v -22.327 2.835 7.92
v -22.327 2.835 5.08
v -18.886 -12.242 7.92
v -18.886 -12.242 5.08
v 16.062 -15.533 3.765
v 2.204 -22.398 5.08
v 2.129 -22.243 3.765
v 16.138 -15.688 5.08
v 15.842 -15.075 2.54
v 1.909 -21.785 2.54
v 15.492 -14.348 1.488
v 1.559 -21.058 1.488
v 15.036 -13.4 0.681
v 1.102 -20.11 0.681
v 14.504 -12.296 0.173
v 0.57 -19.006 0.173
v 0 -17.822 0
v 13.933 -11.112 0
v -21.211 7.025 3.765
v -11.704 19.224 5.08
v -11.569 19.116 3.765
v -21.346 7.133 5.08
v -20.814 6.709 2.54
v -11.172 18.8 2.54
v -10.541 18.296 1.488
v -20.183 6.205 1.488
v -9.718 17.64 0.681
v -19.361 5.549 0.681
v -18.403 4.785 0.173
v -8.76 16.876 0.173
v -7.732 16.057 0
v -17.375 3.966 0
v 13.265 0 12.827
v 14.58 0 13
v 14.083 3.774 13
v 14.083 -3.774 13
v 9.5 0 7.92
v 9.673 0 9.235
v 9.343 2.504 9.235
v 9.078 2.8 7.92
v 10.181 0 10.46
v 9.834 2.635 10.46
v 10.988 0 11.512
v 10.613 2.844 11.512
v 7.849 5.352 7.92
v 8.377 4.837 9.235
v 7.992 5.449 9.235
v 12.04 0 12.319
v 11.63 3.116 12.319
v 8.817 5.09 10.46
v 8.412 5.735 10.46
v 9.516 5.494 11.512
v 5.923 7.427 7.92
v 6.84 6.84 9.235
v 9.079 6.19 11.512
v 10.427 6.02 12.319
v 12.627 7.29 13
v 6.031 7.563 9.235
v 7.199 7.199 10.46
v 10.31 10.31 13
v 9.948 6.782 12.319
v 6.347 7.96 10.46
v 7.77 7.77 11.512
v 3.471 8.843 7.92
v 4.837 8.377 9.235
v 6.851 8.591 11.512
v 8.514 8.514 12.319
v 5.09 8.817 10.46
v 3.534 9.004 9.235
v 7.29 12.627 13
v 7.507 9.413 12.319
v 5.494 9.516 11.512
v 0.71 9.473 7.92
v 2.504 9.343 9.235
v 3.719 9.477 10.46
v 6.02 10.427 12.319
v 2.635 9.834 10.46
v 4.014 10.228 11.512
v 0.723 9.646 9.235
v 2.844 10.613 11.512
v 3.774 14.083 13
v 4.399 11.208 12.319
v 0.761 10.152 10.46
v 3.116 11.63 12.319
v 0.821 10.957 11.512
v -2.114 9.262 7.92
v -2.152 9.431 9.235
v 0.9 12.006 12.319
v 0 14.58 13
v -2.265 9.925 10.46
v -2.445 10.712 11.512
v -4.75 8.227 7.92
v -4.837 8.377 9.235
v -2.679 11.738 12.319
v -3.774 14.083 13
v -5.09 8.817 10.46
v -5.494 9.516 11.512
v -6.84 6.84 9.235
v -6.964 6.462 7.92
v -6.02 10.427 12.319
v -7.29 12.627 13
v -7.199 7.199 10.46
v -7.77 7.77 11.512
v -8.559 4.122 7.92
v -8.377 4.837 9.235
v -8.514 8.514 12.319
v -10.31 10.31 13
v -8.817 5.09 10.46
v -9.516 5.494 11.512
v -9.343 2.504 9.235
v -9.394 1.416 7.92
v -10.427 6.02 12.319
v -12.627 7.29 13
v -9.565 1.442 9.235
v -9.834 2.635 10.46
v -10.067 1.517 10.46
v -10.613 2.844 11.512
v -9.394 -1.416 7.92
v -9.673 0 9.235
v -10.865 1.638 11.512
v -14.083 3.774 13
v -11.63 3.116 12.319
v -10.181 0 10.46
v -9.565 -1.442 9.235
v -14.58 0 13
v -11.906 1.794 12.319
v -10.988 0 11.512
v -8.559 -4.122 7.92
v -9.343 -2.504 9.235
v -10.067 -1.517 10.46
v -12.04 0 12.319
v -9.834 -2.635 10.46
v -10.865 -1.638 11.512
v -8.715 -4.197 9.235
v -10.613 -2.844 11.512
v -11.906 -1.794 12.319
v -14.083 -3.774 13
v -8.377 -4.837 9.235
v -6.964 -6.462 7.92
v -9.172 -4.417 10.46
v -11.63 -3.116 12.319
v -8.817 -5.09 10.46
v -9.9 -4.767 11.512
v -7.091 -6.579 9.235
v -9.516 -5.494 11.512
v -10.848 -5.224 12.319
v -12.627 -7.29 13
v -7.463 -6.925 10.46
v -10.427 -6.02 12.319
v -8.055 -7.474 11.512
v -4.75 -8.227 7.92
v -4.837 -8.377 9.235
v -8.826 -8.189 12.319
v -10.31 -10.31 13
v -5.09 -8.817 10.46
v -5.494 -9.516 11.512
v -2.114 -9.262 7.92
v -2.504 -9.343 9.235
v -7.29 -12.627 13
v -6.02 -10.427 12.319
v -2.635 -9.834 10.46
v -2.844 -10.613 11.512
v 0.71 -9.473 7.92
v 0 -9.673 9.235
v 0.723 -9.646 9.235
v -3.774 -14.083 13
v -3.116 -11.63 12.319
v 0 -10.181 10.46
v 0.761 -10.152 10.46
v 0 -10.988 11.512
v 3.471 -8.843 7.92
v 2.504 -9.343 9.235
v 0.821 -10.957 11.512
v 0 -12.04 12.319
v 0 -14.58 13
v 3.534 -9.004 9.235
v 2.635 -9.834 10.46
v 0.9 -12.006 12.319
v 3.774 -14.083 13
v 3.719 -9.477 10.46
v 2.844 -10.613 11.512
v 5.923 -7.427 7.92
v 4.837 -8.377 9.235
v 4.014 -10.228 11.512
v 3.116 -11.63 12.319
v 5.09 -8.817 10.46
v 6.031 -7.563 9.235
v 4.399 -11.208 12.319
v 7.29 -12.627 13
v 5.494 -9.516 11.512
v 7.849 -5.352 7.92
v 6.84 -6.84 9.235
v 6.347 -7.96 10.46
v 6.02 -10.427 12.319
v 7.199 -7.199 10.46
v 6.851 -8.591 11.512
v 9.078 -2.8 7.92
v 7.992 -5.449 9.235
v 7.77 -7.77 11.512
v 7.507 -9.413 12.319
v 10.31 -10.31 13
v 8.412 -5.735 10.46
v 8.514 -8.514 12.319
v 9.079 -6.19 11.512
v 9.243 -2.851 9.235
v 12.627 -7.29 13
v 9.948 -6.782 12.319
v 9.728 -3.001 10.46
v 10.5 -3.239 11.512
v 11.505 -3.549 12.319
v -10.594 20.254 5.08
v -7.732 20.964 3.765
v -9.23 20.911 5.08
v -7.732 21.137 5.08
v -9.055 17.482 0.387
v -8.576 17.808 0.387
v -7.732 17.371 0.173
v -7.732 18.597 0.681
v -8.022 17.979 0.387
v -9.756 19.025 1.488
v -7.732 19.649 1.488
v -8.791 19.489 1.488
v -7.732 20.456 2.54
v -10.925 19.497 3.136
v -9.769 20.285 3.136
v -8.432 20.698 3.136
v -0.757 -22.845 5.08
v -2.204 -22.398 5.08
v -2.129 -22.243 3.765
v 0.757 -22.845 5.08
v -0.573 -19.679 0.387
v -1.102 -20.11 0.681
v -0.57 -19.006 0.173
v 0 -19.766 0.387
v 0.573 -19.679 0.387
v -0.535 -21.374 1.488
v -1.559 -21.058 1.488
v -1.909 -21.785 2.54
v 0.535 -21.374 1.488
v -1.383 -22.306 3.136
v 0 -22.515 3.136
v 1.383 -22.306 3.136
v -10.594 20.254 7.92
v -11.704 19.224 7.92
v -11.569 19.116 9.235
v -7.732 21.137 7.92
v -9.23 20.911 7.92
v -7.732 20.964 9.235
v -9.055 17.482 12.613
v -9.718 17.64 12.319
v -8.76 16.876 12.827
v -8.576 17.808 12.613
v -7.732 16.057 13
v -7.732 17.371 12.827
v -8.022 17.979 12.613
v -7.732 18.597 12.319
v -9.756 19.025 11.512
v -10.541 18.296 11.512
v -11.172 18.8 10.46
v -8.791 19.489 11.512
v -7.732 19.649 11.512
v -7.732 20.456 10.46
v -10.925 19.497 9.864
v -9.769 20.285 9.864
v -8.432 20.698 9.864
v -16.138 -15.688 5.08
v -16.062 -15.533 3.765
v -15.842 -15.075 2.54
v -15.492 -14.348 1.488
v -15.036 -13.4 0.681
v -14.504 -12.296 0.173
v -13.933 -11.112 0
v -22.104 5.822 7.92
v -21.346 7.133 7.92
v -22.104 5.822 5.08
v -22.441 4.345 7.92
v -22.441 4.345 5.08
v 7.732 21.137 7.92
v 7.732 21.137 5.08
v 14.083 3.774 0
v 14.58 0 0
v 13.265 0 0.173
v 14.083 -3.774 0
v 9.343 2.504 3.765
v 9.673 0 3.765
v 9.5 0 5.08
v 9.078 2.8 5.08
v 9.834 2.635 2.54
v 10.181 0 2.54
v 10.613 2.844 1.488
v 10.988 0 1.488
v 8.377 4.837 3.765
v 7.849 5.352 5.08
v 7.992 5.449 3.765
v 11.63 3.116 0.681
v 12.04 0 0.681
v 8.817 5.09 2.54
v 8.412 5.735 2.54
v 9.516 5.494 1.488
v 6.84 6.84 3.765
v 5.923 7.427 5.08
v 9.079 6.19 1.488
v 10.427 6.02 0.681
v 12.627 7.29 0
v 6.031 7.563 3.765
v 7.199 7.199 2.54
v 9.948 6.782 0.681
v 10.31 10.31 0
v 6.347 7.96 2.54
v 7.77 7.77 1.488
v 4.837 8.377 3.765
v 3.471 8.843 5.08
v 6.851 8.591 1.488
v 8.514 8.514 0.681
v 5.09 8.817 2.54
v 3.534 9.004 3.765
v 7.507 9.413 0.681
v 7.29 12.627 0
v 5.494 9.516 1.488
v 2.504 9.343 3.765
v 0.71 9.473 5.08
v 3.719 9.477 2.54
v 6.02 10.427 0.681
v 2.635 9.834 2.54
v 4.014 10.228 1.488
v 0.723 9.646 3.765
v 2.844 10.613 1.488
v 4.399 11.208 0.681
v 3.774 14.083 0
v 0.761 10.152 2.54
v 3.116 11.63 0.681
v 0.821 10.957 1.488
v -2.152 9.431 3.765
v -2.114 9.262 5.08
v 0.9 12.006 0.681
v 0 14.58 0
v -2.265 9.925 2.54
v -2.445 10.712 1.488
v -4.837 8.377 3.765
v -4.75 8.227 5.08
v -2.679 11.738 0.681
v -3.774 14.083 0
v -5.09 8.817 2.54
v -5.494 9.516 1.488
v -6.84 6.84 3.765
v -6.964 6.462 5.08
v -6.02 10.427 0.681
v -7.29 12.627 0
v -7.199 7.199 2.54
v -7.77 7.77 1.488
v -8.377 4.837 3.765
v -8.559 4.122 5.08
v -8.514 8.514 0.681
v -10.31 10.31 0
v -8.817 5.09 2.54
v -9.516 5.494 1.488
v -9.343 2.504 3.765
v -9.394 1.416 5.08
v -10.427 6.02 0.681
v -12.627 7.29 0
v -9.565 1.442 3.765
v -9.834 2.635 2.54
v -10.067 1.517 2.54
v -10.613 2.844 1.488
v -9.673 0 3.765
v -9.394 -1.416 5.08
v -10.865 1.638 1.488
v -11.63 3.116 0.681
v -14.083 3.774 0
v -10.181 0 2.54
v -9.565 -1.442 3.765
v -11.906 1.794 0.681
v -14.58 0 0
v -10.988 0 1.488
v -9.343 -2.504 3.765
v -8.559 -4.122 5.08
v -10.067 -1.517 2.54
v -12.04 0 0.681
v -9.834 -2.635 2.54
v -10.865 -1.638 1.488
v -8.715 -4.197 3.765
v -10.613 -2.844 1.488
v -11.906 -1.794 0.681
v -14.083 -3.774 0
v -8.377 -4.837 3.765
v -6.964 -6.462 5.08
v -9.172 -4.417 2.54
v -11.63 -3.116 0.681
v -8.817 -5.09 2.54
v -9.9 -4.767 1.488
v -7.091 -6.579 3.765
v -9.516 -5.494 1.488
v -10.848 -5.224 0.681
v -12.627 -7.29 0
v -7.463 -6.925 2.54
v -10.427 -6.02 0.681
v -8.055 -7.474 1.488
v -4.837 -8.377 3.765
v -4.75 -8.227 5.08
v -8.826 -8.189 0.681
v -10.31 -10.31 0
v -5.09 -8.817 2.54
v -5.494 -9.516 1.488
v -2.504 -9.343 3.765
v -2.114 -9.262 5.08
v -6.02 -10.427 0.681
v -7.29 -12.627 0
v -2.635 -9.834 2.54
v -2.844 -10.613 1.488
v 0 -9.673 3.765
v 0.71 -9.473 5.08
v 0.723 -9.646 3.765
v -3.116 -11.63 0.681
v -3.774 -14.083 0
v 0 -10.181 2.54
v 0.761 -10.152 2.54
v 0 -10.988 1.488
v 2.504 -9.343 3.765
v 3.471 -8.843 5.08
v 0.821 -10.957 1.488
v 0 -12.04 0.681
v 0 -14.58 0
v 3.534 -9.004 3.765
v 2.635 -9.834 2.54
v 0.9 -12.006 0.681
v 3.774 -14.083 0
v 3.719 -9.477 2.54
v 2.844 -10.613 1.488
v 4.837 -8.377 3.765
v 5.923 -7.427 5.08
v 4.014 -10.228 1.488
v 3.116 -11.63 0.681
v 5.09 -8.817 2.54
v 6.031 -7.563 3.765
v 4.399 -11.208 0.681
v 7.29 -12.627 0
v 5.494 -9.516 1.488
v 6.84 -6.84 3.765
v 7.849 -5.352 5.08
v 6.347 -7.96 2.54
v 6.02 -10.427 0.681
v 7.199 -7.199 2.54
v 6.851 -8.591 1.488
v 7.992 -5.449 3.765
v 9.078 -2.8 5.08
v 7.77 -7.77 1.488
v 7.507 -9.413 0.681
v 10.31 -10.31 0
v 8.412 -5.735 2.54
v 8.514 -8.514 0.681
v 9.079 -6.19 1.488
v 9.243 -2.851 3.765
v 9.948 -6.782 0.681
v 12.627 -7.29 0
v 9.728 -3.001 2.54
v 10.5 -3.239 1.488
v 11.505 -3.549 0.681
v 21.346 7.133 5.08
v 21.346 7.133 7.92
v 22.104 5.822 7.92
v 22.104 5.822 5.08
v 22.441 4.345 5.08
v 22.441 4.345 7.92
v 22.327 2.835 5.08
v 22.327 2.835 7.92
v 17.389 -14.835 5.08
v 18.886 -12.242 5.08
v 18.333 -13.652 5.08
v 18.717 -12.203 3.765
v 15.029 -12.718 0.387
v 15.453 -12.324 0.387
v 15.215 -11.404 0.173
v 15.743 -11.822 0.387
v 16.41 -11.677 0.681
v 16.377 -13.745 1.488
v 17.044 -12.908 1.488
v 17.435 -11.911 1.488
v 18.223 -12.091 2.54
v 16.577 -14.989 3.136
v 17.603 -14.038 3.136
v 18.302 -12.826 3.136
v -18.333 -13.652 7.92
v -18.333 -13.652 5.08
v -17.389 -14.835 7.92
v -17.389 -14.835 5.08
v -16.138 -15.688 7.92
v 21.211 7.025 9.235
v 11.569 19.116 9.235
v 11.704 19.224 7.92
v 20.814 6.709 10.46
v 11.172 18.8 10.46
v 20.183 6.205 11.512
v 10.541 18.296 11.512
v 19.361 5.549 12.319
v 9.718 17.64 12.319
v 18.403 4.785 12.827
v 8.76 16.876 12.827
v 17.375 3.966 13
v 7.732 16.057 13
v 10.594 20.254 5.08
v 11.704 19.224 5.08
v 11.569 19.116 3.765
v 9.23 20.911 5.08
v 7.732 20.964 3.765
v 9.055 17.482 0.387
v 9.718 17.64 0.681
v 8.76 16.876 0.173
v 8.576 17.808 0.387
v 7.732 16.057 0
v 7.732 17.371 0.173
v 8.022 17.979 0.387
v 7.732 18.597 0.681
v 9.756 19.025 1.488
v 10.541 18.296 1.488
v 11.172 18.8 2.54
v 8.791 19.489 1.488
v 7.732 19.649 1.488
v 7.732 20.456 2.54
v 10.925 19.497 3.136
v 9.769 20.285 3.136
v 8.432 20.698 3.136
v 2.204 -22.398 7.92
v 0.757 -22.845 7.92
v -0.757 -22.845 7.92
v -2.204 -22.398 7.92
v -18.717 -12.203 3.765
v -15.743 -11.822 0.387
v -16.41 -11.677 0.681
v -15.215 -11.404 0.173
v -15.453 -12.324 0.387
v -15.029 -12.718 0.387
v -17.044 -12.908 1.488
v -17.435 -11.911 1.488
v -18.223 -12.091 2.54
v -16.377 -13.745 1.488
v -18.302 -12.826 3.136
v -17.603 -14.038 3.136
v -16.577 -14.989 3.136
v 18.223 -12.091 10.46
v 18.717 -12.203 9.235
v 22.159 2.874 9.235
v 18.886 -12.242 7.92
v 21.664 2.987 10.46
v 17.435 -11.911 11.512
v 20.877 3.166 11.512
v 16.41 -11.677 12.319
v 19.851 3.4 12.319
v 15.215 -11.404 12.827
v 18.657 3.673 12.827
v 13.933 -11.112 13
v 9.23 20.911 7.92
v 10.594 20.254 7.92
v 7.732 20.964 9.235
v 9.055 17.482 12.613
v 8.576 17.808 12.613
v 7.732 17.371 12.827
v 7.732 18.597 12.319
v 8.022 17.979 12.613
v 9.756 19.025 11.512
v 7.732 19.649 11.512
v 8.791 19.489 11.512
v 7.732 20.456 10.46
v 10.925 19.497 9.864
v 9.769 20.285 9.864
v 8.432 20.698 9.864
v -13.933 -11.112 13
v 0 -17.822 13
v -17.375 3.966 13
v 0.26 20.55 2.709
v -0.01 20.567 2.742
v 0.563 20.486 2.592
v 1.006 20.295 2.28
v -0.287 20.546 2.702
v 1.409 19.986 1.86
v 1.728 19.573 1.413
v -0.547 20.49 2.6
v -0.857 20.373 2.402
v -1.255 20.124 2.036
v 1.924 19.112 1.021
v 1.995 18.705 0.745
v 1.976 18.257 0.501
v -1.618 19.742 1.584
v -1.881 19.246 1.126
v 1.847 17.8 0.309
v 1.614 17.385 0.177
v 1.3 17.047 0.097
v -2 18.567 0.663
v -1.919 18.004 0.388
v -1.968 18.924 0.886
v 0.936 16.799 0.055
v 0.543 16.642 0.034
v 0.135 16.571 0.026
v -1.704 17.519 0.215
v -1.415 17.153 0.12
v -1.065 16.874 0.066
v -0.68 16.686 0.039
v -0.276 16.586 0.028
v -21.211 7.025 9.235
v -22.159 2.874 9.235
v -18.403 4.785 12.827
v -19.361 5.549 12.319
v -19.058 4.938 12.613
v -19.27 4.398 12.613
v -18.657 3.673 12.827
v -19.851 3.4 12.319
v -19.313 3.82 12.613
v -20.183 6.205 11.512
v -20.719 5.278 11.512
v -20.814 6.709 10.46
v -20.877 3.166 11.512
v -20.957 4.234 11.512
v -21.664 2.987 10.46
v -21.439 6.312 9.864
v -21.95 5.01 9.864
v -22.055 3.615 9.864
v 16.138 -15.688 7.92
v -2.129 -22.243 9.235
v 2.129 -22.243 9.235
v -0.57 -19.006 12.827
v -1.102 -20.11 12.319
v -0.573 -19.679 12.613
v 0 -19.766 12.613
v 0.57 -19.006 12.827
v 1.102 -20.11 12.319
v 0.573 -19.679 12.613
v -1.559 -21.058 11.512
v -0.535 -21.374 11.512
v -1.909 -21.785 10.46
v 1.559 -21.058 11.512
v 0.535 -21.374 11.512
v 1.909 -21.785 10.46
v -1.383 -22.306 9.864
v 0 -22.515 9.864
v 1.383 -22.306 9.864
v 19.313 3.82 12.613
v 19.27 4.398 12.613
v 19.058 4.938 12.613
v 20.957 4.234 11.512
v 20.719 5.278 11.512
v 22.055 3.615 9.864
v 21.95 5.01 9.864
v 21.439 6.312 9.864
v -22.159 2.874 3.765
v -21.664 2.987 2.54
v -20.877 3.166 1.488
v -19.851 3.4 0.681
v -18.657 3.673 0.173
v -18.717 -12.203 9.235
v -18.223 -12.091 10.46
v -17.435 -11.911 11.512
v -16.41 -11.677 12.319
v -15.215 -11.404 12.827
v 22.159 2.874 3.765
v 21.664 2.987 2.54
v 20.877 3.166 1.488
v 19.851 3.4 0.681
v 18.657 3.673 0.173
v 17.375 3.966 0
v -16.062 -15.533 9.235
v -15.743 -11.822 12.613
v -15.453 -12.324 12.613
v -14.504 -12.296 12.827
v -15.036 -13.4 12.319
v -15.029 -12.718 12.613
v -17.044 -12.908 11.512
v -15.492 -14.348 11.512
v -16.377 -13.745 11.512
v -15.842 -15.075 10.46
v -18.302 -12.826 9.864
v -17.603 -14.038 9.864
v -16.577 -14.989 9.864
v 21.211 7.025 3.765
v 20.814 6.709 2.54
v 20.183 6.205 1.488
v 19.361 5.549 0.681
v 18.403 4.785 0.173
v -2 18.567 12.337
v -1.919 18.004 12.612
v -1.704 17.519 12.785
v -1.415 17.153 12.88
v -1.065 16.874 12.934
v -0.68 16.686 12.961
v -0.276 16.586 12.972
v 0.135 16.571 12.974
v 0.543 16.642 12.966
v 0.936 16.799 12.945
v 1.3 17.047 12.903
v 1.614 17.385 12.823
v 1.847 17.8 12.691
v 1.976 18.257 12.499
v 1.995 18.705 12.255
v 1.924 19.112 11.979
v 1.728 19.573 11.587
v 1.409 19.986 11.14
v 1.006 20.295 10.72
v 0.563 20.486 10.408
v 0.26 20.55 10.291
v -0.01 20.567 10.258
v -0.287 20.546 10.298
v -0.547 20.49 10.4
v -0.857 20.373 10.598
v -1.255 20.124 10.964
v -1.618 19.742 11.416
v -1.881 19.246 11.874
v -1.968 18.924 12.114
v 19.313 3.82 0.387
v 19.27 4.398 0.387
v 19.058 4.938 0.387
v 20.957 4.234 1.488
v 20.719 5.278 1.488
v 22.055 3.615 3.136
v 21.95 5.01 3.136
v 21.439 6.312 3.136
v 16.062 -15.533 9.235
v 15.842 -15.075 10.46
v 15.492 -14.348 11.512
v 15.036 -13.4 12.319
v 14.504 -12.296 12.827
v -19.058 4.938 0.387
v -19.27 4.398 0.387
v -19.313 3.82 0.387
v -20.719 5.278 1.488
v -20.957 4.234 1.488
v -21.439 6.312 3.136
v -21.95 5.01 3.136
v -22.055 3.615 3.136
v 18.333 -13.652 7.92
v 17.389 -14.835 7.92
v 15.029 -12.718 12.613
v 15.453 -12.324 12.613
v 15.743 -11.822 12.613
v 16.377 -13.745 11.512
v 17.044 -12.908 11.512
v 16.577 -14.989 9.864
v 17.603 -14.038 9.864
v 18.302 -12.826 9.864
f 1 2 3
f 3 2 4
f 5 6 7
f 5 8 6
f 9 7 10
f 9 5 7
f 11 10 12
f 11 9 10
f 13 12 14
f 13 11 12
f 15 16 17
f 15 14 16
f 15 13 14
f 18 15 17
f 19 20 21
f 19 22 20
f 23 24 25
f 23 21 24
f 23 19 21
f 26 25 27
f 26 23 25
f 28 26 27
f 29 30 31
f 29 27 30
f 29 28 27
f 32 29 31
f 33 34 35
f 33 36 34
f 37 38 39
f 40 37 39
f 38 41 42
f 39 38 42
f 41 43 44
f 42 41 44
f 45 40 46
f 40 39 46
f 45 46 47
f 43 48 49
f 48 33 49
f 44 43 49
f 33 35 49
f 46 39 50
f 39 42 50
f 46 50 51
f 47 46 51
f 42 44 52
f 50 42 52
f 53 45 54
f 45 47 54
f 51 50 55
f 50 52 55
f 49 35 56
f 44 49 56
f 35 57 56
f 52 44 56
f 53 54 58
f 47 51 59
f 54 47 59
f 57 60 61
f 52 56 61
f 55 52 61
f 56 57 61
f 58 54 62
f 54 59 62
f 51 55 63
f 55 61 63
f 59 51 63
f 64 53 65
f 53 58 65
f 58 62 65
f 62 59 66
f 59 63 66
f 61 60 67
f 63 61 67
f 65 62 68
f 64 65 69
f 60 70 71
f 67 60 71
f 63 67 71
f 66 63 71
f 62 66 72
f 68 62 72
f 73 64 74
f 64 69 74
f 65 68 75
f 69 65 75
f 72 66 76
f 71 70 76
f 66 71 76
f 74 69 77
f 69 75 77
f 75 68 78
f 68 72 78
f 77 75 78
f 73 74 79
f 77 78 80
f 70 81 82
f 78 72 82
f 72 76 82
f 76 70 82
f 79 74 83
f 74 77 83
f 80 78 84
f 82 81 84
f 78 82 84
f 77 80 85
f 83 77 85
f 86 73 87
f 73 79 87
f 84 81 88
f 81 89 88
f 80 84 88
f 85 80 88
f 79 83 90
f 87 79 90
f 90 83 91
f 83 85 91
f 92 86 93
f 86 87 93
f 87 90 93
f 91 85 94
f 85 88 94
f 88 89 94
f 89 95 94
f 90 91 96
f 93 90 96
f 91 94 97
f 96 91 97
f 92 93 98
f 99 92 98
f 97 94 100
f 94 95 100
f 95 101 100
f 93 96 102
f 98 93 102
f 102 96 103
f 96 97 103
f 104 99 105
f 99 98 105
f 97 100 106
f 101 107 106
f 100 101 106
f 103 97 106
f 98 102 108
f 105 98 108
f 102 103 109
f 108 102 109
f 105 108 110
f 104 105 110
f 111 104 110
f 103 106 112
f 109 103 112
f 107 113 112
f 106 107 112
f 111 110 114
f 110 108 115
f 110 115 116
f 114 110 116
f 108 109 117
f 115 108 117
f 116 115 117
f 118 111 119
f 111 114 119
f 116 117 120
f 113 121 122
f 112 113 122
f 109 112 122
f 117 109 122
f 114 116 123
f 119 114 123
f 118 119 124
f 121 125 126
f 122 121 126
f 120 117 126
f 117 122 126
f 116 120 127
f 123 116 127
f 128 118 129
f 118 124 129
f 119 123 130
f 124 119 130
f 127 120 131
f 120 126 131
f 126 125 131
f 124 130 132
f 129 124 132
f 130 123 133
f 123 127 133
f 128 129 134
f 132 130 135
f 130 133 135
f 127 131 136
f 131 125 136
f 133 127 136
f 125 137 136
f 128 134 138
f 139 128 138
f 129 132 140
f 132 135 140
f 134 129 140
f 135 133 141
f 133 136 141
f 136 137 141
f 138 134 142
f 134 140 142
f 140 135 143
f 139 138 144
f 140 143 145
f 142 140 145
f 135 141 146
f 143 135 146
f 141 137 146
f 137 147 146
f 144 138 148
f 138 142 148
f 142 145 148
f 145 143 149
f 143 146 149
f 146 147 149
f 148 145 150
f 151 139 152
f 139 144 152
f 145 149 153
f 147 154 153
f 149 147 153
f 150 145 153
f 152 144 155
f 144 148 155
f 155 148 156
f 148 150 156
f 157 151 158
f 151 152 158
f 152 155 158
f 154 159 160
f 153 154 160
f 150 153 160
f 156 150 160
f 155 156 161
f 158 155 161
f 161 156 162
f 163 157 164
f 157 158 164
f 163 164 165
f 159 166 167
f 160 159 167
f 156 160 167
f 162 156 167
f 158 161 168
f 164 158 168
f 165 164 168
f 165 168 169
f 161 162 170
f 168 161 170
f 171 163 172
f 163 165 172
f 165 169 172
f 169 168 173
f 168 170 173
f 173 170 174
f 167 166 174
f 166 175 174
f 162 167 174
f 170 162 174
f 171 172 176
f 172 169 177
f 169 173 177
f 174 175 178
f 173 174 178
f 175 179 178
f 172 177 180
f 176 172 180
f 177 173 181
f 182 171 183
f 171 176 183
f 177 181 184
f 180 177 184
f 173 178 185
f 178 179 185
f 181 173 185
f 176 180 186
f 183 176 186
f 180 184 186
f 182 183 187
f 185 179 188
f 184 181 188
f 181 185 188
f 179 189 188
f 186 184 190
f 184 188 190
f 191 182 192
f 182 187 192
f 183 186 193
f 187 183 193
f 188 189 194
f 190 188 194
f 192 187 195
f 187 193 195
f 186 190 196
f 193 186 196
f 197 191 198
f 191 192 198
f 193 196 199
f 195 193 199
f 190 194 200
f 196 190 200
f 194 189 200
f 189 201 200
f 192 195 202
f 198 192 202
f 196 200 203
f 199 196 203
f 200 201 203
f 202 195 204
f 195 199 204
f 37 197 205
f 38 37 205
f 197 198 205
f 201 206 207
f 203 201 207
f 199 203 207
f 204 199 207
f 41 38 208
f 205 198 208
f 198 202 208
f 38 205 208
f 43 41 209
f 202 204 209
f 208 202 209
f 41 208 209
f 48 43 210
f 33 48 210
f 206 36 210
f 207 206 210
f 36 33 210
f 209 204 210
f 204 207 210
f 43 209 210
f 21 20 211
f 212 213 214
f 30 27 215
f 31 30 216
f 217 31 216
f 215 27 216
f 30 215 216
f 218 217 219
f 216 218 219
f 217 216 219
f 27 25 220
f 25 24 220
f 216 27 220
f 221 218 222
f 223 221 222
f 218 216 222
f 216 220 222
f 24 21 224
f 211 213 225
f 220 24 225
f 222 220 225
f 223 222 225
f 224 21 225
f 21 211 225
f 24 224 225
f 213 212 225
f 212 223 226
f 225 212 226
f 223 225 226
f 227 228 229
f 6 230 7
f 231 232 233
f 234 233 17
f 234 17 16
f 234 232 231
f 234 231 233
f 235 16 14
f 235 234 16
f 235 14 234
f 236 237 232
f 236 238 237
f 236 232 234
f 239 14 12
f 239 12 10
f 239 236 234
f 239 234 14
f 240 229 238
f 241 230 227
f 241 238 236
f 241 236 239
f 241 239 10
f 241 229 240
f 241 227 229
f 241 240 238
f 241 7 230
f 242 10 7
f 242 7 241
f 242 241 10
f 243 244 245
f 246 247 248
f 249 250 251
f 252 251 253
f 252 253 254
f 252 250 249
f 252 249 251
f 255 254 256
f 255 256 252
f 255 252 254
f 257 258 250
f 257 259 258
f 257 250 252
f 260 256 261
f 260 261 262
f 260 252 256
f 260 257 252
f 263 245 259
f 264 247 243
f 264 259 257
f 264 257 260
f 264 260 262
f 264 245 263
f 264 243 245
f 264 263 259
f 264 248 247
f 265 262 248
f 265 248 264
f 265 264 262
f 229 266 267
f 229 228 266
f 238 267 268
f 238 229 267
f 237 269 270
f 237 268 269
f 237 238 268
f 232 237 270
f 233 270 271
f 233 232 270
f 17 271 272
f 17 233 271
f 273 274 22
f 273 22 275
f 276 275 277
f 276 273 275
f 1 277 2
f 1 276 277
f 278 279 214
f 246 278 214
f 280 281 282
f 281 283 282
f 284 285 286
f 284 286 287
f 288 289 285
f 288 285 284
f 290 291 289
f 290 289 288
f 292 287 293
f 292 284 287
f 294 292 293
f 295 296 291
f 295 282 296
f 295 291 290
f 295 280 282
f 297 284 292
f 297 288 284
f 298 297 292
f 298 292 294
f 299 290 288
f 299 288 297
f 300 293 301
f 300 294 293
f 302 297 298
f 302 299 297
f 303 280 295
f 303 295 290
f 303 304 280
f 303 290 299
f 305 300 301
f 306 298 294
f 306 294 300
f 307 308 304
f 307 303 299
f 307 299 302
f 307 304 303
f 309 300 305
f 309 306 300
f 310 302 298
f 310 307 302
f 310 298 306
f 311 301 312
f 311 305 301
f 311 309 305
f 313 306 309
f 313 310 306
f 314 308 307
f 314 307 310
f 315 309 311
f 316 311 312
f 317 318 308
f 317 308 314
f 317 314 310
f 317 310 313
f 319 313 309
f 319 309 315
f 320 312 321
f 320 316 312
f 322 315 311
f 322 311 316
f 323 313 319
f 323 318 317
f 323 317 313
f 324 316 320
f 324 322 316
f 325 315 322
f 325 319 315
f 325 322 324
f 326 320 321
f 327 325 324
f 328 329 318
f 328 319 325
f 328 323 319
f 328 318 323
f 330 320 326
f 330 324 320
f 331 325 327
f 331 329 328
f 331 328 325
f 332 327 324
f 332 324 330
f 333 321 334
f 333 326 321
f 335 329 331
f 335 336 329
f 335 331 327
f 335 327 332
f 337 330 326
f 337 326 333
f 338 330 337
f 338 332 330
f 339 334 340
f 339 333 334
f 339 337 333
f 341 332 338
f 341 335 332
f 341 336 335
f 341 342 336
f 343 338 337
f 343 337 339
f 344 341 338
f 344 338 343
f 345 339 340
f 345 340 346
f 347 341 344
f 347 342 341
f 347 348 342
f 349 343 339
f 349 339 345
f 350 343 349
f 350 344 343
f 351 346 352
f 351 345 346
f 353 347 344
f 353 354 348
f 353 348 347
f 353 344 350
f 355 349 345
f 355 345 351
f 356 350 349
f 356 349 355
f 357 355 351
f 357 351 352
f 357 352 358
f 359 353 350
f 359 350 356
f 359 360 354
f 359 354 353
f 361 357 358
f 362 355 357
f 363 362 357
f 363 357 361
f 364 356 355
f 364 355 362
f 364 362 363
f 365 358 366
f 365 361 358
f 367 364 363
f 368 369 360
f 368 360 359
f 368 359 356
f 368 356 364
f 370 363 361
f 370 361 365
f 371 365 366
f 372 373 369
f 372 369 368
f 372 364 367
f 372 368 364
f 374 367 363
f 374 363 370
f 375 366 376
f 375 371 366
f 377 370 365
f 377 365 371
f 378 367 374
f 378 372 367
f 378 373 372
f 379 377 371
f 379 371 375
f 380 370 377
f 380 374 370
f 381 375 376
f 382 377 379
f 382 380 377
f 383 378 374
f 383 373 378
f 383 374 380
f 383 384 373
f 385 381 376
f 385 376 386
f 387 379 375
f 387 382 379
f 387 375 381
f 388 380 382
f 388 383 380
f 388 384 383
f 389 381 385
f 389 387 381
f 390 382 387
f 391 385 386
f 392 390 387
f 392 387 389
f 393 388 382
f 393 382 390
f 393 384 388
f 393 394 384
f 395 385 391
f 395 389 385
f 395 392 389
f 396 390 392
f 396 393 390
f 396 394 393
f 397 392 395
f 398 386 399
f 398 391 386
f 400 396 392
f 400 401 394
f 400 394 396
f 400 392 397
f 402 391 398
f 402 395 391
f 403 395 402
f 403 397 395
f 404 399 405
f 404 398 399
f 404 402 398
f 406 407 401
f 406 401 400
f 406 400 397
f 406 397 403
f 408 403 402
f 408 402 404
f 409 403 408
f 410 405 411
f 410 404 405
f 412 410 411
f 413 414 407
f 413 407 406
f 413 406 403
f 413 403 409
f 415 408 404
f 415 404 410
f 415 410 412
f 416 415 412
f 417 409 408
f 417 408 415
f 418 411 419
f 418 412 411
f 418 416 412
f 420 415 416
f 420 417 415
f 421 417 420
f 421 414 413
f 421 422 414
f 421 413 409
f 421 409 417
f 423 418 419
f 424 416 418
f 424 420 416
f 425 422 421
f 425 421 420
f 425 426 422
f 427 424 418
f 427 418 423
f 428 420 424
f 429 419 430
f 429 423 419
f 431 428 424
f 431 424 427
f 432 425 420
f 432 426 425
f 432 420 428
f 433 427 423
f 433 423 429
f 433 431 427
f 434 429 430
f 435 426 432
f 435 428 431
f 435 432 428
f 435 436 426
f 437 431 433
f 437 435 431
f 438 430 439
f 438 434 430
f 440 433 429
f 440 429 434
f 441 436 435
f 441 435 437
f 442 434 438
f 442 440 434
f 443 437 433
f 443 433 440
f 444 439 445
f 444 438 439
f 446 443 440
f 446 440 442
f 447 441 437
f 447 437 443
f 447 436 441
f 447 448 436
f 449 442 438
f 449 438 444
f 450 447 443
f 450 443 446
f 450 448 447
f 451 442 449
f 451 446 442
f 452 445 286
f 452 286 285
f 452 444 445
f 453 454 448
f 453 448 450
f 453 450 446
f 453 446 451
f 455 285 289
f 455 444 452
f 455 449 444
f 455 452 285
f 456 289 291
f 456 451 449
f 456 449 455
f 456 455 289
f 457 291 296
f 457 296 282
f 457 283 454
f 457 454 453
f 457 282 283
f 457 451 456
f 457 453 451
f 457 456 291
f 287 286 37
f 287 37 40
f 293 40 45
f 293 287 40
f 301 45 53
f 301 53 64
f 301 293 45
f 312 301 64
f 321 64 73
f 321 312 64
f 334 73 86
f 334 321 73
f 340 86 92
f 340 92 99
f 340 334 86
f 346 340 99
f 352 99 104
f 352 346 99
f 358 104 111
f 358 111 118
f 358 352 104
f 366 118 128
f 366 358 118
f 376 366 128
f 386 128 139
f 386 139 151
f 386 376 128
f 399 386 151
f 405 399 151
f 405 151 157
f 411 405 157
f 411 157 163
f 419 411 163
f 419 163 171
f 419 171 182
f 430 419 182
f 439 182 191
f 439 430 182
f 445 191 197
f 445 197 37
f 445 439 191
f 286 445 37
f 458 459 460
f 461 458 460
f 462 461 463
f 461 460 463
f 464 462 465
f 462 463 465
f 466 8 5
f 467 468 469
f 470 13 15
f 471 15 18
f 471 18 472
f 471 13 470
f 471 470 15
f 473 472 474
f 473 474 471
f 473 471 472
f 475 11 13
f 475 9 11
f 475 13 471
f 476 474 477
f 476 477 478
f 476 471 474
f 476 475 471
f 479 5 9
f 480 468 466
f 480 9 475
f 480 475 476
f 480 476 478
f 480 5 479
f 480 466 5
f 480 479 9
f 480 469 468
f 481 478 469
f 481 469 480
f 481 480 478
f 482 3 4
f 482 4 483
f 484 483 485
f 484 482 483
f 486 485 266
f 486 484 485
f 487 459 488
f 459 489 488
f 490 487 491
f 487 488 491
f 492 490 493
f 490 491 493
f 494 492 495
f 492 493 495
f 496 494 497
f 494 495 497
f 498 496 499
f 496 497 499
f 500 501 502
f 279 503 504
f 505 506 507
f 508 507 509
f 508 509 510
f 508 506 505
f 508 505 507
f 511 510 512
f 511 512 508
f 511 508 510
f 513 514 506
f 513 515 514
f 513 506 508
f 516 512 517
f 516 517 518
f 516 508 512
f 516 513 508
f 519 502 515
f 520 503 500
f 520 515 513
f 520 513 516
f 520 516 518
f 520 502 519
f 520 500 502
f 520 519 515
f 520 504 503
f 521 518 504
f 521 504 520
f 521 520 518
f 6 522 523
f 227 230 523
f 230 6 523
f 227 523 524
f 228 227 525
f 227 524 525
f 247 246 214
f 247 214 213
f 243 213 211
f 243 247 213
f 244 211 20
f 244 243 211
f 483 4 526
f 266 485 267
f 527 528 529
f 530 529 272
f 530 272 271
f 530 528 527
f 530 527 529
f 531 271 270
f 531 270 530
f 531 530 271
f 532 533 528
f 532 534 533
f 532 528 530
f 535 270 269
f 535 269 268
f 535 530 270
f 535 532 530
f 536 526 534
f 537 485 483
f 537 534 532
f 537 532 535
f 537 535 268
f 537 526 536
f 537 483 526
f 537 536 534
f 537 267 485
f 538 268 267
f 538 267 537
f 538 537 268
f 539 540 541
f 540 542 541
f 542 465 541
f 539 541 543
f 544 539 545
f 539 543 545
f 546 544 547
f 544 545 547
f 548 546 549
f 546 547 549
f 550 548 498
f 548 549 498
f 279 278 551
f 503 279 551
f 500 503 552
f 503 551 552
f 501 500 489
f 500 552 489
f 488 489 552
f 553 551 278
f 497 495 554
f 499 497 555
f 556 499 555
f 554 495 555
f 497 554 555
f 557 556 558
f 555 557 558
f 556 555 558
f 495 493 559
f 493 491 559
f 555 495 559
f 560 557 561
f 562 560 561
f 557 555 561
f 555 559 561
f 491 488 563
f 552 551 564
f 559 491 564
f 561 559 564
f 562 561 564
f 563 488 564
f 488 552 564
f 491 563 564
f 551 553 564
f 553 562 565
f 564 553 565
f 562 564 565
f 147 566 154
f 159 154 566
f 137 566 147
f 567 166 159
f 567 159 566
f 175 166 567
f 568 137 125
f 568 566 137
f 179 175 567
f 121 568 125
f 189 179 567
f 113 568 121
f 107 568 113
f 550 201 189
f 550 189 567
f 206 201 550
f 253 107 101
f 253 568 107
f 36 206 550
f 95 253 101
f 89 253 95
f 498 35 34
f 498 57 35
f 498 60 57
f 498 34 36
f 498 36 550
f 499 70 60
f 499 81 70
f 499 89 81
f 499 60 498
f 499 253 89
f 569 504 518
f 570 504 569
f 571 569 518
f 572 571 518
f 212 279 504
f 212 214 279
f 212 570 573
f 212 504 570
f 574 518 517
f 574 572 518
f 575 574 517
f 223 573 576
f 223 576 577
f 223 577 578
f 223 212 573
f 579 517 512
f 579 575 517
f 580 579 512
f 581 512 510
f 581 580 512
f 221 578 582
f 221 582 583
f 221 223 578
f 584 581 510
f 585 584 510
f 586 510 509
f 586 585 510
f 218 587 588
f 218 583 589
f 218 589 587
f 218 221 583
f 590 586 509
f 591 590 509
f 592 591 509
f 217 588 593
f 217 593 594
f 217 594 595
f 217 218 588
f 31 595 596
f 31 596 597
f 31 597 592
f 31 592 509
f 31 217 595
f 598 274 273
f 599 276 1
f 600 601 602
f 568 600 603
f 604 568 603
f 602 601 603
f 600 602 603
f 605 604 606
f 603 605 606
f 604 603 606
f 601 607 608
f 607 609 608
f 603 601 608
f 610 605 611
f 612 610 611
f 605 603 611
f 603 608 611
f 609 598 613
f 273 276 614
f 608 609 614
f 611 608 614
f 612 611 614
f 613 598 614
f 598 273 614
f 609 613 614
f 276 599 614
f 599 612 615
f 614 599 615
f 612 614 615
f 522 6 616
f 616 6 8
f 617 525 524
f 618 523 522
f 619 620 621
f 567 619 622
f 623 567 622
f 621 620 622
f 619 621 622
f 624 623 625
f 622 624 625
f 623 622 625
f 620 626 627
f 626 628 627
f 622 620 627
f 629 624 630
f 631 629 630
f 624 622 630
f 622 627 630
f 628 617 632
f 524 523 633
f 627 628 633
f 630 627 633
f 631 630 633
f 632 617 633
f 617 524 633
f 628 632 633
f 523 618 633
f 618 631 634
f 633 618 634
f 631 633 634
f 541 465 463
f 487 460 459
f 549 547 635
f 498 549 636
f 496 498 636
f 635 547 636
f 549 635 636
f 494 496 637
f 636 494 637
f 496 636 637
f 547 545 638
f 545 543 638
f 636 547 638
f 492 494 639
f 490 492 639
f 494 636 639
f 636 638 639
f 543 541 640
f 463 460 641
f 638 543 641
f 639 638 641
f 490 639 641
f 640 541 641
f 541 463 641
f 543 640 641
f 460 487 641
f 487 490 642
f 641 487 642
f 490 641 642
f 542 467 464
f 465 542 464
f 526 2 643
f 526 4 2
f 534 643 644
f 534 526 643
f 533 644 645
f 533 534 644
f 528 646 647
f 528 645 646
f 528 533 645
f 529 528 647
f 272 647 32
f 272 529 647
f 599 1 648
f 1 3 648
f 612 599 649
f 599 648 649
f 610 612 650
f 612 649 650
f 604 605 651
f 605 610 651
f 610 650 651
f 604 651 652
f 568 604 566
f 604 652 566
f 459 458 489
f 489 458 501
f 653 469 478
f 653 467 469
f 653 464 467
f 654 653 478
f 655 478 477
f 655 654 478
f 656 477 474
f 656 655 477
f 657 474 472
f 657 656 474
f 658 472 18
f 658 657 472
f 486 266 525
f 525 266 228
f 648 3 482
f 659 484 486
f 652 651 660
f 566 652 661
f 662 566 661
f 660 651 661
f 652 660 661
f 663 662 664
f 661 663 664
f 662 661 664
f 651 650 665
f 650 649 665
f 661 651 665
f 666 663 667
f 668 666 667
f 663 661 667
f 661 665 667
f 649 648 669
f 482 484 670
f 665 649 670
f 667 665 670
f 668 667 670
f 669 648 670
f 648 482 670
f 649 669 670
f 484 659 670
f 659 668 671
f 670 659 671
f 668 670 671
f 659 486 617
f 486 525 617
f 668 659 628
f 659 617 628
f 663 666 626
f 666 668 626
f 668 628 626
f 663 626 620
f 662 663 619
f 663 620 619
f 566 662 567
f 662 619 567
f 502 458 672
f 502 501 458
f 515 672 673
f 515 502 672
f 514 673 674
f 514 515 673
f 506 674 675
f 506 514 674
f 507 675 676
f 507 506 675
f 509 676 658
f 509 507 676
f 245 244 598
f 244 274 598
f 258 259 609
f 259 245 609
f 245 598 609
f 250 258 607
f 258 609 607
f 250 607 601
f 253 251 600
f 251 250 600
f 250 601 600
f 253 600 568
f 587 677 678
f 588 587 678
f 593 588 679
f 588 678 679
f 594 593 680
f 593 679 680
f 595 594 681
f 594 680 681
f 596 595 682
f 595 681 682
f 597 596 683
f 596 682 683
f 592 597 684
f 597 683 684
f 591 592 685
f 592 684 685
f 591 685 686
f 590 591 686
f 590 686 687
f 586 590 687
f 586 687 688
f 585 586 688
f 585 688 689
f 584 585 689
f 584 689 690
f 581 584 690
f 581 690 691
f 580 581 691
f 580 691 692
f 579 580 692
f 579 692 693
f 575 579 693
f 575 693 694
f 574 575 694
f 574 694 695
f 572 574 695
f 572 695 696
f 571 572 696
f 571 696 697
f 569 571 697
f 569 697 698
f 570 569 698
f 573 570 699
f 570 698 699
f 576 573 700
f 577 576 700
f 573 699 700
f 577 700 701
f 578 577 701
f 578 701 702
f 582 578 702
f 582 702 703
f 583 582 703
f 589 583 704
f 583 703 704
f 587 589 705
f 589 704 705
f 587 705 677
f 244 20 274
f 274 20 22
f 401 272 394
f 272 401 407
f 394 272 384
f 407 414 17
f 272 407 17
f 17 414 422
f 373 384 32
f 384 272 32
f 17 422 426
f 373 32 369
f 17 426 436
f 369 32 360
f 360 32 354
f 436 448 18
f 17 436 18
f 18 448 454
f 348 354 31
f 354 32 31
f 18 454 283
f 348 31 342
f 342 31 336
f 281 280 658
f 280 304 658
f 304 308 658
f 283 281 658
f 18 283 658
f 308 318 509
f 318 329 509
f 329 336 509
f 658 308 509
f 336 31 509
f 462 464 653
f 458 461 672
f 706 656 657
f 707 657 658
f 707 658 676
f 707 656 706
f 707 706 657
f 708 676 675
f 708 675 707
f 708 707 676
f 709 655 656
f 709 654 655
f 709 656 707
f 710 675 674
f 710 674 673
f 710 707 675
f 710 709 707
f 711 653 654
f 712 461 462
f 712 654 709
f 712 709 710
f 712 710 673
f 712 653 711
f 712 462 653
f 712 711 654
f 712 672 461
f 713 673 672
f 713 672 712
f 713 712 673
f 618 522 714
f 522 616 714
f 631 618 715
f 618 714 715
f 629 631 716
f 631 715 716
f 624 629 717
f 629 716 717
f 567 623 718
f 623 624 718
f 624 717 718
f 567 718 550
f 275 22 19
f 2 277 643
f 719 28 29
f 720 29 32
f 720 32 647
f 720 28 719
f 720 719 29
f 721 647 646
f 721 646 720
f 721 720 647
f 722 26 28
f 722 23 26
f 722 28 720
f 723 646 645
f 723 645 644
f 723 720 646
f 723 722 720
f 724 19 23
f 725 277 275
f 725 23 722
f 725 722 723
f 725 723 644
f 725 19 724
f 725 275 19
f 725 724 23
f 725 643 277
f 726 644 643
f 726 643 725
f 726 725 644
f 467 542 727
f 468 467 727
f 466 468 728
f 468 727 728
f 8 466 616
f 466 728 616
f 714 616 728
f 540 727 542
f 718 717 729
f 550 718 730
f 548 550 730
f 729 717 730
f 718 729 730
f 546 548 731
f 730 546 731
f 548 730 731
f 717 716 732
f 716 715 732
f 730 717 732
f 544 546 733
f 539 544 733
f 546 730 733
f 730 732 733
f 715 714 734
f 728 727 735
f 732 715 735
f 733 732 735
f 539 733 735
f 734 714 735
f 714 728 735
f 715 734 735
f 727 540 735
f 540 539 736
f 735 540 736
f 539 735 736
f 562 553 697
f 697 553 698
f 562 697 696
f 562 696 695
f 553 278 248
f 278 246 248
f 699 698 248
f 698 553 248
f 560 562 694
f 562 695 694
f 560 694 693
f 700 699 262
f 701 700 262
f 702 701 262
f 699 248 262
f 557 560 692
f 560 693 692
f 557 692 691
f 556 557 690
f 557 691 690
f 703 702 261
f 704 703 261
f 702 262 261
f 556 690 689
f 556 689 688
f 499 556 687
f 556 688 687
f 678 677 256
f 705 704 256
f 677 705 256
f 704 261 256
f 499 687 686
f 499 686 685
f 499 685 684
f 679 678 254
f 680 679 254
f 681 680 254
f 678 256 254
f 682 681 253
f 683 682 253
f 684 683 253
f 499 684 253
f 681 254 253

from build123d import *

# Parameters (mm, degrees)
F0_R     = 9.5
F1_DEPTH = 13
F2_R     = 5.08
F4_D     = 4


with BuildPart() as f1:
    # F0 (on Top) → F1 (new body)
    with BuildSketch(Plane.XY):
        Polygon((10.1788821743, 21.1366666282), (-10.1788821743, 21.1366666282), (-22.8717406344, 5.2203255477), (-18.3417118982, -14.6270271454), (0, -23.4599300611), (18.3417118982, -14.6270271454), (22.8717406344, 5.2203255477), align=None)
        Circle(F0_R, mode=Mode.SUBTRACT)
    extrude(amount=F1_DEPTH)

    # F2
    f2_edges = [f1.edges().sort_by_distance(p)[0] for p in [
        (-9.5, 0, 0),
        (-9.5, 0, 13),
        (-10.178882, 21.136667, 6.5),
        (-22.871741, 5.220326, 6.5),
        (-16.525311, 13.178496, 0),
        (-16.525311, 13.178496, 13),
        (-18.341712, -14.627027, 6.5),
        (-20.606726, -4.703351, 0),
        (-20.606726, -4.703351, 13),
        (0, -23.45993, 6.5),
        (-9.170856, -19.043479, 0),
        (-9.170856, -19.043479, 13),
        (18.341712, -14.627027, 6.5),
        (9.170856, -19.043479, 0),
        (9.170856, -19.043479, 13),
        (22.871741, 5.220326, 6.5),
        (20.606726, -4.703351, 0),
        (20.606726, -4.703351, 13),
        (10.178882, 21.136667, 6.5),
        (16.525311, 13.178496, 0),
        (16.525311, 13.178496, 13),
        (0, 21.136667, 0),
        (0, 21.136667, 13),
    ]]
    fillet(f2_edges, radius=F2_R)

    # F4 (through all)
    with Locations(Plane(origin=(0, 0, 0), x_dir=(1, 0, 0), z_dir=(0, 0, -1))):
        with Locations((0, -18.5665413737)):
            Hole(F4_D / 2)


solid = f1.part
